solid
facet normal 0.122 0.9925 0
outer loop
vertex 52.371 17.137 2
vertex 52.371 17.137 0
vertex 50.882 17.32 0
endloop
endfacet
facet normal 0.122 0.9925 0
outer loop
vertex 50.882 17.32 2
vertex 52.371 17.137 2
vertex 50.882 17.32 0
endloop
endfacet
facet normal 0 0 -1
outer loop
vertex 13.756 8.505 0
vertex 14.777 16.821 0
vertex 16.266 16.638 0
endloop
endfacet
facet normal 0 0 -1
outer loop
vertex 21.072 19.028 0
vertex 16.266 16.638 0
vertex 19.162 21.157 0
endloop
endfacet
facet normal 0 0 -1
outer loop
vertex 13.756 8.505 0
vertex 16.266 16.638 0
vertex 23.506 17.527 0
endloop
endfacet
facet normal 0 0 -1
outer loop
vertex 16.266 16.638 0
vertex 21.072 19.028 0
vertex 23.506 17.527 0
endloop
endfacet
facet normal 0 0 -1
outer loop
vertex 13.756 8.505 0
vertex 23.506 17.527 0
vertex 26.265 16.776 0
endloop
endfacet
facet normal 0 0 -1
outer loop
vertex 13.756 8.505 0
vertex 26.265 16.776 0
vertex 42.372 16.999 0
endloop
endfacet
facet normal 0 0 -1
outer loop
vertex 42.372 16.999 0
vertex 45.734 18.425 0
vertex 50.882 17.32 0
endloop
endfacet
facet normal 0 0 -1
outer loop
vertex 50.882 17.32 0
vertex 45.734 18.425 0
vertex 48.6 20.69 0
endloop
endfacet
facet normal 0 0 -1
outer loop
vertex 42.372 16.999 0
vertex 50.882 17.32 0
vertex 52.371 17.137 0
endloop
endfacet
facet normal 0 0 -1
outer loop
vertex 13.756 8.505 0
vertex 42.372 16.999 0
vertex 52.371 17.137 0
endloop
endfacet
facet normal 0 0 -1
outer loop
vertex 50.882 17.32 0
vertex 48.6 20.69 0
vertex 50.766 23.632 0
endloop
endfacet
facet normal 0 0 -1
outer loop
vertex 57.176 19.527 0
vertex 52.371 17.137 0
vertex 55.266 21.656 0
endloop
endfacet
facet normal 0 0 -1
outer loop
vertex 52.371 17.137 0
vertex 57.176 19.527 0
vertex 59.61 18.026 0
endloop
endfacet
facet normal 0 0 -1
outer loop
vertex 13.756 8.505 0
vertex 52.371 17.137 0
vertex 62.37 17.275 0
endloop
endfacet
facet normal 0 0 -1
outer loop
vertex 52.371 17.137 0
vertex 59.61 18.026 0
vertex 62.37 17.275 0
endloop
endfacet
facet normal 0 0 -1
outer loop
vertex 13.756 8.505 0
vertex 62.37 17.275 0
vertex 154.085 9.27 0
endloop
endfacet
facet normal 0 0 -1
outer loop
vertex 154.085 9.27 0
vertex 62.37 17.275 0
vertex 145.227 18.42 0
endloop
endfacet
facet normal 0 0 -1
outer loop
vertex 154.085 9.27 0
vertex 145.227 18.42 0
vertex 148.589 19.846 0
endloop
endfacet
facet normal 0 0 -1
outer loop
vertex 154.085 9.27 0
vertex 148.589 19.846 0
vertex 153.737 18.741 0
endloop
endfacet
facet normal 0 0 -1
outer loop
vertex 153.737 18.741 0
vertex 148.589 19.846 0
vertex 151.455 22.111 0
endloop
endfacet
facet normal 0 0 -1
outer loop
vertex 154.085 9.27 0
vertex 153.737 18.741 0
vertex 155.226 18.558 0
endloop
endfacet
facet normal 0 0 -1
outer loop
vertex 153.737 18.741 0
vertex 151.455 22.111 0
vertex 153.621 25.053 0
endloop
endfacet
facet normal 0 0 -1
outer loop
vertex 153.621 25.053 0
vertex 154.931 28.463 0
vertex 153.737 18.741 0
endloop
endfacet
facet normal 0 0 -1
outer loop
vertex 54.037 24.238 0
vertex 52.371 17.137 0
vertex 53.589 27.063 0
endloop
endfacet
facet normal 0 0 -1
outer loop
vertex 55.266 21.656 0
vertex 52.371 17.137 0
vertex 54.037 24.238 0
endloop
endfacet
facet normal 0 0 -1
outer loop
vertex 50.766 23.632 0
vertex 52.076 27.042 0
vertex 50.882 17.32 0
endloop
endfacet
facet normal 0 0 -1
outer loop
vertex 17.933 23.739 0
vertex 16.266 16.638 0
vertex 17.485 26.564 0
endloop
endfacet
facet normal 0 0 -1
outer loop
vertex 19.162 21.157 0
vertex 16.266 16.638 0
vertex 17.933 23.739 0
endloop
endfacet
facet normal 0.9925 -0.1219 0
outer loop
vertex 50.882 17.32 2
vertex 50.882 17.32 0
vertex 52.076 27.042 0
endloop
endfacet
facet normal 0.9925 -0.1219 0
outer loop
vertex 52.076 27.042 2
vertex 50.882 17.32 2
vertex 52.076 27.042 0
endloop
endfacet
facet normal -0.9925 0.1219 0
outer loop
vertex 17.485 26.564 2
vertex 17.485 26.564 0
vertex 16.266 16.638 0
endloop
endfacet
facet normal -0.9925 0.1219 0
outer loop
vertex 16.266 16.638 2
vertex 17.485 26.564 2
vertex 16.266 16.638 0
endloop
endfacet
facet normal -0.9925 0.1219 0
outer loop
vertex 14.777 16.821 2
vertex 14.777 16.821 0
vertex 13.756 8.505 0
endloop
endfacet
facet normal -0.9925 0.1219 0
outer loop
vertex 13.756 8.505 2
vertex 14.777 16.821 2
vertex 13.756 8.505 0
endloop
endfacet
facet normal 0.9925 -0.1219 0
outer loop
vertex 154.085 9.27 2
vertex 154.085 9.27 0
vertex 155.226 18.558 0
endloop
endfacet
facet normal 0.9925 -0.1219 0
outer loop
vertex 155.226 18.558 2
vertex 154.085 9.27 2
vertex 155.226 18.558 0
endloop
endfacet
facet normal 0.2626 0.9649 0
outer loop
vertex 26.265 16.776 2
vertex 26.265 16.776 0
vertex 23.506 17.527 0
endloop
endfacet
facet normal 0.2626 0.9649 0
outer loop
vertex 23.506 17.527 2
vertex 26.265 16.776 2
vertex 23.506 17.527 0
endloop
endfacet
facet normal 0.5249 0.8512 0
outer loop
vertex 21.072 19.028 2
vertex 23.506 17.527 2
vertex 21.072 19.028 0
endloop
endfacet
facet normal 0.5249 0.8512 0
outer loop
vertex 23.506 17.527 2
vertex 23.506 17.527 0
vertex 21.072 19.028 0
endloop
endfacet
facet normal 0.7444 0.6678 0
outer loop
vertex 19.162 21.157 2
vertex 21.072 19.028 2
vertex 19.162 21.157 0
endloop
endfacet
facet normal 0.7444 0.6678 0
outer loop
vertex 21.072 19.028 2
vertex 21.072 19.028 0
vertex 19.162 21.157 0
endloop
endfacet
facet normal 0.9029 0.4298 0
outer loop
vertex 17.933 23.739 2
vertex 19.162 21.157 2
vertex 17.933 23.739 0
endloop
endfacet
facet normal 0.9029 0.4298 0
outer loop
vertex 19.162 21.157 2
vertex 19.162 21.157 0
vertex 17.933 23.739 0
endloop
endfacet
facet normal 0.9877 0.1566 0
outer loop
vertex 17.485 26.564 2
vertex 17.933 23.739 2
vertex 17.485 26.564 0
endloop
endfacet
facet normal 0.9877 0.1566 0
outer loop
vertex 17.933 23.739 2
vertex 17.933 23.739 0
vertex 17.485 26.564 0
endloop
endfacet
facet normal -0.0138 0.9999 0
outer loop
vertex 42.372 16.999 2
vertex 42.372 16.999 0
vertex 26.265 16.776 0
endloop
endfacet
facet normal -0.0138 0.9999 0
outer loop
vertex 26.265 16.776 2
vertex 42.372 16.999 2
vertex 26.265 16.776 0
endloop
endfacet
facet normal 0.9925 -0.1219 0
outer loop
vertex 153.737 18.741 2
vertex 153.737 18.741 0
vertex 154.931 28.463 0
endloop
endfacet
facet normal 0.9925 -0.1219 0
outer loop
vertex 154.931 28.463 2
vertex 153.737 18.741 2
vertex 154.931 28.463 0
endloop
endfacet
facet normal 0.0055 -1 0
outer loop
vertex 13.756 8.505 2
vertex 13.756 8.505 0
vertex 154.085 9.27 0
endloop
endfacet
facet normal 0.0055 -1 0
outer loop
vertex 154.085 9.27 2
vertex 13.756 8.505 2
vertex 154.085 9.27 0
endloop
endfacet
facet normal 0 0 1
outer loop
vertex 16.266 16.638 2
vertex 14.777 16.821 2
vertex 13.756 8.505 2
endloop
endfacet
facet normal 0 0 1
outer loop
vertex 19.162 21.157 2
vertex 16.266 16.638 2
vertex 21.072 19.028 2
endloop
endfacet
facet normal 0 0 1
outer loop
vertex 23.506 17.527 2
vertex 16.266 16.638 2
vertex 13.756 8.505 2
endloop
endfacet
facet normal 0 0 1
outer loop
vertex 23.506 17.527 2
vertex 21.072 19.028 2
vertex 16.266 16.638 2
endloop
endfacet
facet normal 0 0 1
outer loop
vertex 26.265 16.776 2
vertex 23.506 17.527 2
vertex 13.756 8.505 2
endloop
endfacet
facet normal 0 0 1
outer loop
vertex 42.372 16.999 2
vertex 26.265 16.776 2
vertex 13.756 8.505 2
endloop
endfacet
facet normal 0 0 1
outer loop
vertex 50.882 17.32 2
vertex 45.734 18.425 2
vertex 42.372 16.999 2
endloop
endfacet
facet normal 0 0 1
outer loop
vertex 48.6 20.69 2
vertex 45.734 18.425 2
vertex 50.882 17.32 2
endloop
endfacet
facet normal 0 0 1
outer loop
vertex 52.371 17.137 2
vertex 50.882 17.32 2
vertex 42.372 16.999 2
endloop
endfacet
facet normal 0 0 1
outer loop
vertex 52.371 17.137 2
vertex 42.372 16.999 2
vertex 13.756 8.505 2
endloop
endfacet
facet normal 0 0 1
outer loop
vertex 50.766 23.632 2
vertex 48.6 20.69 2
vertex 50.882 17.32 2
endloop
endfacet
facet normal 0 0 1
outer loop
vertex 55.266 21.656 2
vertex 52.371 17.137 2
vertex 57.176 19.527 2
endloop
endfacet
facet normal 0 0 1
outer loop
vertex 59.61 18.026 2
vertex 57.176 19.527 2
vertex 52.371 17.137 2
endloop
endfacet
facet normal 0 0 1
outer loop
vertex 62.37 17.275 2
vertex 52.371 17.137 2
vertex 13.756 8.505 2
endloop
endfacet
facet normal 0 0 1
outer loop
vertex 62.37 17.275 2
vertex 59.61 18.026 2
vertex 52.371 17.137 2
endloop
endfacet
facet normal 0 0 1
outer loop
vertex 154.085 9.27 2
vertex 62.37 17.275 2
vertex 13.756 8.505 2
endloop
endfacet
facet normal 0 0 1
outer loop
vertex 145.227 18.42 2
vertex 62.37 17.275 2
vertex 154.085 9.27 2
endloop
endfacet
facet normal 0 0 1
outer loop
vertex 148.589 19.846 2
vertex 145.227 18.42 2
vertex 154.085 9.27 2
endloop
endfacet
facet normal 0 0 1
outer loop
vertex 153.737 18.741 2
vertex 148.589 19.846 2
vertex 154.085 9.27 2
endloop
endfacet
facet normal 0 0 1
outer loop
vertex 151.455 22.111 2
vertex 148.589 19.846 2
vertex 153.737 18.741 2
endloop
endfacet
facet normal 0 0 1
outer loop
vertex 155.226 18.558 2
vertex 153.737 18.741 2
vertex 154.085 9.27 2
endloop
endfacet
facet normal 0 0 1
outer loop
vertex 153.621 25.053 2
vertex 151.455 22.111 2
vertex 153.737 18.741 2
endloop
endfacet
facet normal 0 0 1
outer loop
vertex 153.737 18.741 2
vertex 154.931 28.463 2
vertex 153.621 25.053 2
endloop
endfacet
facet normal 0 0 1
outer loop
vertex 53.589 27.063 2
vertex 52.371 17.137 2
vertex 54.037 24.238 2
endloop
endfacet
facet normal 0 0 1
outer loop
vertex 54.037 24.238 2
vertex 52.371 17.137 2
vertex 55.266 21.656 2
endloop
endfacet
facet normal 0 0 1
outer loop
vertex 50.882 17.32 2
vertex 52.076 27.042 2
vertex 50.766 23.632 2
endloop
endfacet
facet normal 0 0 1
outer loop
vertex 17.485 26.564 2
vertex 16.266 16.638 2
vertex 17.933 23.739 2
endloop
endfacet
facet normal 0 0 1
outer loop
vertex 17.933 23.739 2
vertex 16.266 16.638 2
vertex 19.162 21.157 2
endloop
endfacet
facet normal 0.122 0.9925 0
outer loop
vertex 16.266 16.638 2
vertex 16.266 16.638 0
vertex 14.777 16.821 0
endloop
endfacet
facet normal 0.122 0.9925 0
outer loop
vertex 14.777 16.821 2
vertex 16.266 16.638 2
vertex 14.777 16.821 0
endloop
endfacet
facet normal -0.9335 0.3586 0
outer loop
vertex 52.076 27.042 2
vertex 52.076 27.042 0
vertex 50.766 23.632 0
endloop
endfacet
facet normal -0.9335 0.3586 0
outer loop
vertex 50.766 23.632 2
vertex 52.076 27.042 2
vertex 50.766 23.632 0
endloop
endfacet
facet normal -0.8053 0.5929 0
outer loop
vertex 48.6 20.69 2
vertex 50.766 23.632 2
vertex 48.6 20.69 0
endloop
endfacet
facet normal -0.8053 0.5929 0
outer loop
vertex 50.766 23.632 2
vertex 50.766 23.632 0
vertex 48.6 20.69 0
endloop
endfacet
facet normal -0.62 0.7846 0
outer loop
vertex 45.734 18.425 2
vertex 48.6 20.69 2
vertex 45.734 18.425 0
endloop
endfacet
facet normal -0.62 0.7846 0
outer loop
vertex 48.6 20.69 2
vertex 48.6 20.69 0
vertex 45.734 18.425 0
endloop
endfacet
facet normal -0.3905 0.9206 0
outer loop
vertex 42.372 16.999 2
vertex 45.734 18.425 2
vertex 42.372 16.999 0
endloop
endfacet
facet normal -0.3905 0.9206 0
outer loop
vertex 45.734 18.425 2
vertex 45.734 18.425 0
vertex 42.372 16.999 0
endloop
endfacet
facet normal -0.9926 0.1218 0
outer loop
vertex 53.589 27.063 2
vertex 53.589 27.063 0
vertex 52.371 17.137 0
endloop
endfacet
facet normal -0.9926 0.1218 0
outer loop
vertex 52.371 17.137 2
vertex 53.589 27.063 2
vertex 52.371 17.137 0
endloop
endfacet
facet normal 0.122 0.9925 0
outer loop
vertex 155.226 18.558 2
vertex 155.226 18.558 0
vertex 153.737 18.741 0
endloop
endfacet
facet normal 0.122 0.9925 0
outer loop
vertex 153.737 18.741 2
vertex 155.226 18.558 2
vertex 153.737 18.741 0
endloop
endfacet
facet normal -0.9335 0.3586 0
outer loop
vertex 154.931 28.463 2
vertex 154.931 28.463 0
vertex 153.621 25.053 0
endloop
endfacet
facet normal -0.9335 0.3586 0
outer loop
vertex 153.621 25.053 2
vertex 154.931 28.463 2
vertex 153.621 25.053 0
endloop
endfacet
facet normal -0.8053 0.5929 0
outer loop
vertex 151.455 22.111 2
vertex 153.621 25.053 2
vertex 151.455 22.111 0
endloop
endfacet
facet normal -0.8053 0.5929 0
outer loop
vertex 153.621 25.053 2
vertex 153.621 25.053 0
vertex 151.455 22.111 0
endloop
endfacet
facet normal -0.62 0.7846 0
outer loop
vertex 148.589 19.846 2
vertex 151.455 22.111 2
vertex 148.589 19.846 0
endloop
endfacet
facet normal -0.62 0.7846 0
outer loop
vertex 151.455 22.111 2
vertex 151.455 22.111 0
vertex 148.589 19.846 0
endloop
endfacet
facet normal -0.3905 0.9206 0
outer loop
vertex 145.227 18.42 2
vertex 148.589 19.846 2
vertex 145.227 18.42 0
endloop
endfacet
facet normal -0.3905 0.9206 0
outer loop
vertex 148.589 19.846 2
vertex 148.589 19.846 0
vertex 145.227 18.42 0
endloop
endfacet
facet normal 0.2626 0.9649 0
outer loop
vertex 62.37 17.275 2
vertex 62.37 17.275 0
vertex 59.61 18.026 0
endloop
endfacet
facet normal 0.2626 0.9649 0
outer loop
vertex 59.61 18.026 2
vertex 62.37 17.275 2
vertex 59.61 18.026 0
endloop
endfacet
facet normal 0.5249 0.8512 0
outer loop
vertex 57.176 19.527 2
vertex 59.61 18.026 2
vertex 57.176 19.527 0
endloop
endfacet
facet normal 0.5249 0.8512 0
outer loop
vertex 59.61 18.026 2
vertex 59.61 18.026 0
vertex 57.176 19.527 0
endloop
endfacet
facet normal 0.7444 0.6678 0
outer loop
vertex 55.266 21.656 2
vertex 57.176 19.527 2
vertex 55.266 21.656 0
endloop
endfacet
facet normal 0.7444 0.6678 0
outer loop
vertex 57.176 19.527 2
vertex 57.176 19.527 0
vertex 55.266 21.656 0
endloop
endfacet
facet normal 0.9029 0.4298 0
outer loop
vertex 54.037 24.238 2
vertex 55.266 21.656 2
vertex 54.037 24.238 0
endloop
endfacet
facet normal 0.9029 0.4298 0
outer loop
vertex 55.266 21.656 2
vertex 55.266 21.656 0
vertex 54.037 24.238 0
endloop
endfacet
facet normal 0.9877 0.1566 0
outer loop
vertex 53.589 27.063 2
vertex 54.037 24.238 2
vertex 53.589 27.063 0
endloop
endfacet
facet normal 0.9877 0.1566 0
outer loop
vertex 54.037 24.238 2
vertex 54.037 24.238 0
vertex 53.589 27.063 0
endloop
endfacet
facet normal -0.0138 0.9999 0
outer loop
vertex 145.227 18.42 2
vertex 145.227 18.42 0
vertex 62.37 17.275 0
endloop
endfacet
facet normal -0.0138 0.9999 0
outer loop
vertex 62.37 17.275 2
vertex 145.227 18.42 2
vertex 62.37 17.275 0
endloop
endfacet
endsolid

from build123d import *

# Parameters (mm, degrees)
EXTRUDE_1_DEPTH = 2


with BuildPart() as part:
    # Model → 凸台-拉伸1 (new body)
    with BuildSketch(Plane.XY):
        with BuildLine():
            Line((13.756138035, 8.504570041), (154.085282898, 9.270484114))
            Line((154.085282898, 9.270484114), (155.225675402, 18.558235729))
            Line((155.225675402, 18.558235729), (153.736856174, 18.741039745))
            Line((153.736856174, 18.741039745), (154.930535969, 28.462781514))
            ThreePointArc((154.930535969, 28.462781514), (151.455462166, 22.111002891), (145.226629731, 18.420084836))
            Line((145.226629731, 18.420084836), (62.369712658, 17.275299877))
            ThreePointArc((62.369712658, 17.275299877), (56.144799442, 20.522983318), (53.589360421, 27.062610501))
            Line((53.589360421, 27.062610501), (52.370666987, 17.137148984))
            Line((52.370666987, 17.137148984), (50.881847759, 17.319952999))
            Line((50.881847759, 17.319952999), (52.075527554, 27.041694768))
            ThreePointArc((52.075527554, 27.041694768), (48.600453751, 20.689916146), (42.371621316, 16.998998091))
            Line((42.371621316, 16.998998091), (26.265146572, 16.776464467))
            ThreePointArc((26.265146572, 16.776464467), (20.040233356, 20.024147907), (17.484794335, 26.56377509))
            Line((17.484794335, 26.56377509), (16.266100901, 16.638313574))
            Line((16.266100901, 16.638313574), (14.777281674, 16.821117589))
            Line((14.777281674, 16.821117589), (13.756138035, 8.504570041))
        make_face()
    extrude(amount=EXTRUDE_1_DEPTH)


solid = part.part
